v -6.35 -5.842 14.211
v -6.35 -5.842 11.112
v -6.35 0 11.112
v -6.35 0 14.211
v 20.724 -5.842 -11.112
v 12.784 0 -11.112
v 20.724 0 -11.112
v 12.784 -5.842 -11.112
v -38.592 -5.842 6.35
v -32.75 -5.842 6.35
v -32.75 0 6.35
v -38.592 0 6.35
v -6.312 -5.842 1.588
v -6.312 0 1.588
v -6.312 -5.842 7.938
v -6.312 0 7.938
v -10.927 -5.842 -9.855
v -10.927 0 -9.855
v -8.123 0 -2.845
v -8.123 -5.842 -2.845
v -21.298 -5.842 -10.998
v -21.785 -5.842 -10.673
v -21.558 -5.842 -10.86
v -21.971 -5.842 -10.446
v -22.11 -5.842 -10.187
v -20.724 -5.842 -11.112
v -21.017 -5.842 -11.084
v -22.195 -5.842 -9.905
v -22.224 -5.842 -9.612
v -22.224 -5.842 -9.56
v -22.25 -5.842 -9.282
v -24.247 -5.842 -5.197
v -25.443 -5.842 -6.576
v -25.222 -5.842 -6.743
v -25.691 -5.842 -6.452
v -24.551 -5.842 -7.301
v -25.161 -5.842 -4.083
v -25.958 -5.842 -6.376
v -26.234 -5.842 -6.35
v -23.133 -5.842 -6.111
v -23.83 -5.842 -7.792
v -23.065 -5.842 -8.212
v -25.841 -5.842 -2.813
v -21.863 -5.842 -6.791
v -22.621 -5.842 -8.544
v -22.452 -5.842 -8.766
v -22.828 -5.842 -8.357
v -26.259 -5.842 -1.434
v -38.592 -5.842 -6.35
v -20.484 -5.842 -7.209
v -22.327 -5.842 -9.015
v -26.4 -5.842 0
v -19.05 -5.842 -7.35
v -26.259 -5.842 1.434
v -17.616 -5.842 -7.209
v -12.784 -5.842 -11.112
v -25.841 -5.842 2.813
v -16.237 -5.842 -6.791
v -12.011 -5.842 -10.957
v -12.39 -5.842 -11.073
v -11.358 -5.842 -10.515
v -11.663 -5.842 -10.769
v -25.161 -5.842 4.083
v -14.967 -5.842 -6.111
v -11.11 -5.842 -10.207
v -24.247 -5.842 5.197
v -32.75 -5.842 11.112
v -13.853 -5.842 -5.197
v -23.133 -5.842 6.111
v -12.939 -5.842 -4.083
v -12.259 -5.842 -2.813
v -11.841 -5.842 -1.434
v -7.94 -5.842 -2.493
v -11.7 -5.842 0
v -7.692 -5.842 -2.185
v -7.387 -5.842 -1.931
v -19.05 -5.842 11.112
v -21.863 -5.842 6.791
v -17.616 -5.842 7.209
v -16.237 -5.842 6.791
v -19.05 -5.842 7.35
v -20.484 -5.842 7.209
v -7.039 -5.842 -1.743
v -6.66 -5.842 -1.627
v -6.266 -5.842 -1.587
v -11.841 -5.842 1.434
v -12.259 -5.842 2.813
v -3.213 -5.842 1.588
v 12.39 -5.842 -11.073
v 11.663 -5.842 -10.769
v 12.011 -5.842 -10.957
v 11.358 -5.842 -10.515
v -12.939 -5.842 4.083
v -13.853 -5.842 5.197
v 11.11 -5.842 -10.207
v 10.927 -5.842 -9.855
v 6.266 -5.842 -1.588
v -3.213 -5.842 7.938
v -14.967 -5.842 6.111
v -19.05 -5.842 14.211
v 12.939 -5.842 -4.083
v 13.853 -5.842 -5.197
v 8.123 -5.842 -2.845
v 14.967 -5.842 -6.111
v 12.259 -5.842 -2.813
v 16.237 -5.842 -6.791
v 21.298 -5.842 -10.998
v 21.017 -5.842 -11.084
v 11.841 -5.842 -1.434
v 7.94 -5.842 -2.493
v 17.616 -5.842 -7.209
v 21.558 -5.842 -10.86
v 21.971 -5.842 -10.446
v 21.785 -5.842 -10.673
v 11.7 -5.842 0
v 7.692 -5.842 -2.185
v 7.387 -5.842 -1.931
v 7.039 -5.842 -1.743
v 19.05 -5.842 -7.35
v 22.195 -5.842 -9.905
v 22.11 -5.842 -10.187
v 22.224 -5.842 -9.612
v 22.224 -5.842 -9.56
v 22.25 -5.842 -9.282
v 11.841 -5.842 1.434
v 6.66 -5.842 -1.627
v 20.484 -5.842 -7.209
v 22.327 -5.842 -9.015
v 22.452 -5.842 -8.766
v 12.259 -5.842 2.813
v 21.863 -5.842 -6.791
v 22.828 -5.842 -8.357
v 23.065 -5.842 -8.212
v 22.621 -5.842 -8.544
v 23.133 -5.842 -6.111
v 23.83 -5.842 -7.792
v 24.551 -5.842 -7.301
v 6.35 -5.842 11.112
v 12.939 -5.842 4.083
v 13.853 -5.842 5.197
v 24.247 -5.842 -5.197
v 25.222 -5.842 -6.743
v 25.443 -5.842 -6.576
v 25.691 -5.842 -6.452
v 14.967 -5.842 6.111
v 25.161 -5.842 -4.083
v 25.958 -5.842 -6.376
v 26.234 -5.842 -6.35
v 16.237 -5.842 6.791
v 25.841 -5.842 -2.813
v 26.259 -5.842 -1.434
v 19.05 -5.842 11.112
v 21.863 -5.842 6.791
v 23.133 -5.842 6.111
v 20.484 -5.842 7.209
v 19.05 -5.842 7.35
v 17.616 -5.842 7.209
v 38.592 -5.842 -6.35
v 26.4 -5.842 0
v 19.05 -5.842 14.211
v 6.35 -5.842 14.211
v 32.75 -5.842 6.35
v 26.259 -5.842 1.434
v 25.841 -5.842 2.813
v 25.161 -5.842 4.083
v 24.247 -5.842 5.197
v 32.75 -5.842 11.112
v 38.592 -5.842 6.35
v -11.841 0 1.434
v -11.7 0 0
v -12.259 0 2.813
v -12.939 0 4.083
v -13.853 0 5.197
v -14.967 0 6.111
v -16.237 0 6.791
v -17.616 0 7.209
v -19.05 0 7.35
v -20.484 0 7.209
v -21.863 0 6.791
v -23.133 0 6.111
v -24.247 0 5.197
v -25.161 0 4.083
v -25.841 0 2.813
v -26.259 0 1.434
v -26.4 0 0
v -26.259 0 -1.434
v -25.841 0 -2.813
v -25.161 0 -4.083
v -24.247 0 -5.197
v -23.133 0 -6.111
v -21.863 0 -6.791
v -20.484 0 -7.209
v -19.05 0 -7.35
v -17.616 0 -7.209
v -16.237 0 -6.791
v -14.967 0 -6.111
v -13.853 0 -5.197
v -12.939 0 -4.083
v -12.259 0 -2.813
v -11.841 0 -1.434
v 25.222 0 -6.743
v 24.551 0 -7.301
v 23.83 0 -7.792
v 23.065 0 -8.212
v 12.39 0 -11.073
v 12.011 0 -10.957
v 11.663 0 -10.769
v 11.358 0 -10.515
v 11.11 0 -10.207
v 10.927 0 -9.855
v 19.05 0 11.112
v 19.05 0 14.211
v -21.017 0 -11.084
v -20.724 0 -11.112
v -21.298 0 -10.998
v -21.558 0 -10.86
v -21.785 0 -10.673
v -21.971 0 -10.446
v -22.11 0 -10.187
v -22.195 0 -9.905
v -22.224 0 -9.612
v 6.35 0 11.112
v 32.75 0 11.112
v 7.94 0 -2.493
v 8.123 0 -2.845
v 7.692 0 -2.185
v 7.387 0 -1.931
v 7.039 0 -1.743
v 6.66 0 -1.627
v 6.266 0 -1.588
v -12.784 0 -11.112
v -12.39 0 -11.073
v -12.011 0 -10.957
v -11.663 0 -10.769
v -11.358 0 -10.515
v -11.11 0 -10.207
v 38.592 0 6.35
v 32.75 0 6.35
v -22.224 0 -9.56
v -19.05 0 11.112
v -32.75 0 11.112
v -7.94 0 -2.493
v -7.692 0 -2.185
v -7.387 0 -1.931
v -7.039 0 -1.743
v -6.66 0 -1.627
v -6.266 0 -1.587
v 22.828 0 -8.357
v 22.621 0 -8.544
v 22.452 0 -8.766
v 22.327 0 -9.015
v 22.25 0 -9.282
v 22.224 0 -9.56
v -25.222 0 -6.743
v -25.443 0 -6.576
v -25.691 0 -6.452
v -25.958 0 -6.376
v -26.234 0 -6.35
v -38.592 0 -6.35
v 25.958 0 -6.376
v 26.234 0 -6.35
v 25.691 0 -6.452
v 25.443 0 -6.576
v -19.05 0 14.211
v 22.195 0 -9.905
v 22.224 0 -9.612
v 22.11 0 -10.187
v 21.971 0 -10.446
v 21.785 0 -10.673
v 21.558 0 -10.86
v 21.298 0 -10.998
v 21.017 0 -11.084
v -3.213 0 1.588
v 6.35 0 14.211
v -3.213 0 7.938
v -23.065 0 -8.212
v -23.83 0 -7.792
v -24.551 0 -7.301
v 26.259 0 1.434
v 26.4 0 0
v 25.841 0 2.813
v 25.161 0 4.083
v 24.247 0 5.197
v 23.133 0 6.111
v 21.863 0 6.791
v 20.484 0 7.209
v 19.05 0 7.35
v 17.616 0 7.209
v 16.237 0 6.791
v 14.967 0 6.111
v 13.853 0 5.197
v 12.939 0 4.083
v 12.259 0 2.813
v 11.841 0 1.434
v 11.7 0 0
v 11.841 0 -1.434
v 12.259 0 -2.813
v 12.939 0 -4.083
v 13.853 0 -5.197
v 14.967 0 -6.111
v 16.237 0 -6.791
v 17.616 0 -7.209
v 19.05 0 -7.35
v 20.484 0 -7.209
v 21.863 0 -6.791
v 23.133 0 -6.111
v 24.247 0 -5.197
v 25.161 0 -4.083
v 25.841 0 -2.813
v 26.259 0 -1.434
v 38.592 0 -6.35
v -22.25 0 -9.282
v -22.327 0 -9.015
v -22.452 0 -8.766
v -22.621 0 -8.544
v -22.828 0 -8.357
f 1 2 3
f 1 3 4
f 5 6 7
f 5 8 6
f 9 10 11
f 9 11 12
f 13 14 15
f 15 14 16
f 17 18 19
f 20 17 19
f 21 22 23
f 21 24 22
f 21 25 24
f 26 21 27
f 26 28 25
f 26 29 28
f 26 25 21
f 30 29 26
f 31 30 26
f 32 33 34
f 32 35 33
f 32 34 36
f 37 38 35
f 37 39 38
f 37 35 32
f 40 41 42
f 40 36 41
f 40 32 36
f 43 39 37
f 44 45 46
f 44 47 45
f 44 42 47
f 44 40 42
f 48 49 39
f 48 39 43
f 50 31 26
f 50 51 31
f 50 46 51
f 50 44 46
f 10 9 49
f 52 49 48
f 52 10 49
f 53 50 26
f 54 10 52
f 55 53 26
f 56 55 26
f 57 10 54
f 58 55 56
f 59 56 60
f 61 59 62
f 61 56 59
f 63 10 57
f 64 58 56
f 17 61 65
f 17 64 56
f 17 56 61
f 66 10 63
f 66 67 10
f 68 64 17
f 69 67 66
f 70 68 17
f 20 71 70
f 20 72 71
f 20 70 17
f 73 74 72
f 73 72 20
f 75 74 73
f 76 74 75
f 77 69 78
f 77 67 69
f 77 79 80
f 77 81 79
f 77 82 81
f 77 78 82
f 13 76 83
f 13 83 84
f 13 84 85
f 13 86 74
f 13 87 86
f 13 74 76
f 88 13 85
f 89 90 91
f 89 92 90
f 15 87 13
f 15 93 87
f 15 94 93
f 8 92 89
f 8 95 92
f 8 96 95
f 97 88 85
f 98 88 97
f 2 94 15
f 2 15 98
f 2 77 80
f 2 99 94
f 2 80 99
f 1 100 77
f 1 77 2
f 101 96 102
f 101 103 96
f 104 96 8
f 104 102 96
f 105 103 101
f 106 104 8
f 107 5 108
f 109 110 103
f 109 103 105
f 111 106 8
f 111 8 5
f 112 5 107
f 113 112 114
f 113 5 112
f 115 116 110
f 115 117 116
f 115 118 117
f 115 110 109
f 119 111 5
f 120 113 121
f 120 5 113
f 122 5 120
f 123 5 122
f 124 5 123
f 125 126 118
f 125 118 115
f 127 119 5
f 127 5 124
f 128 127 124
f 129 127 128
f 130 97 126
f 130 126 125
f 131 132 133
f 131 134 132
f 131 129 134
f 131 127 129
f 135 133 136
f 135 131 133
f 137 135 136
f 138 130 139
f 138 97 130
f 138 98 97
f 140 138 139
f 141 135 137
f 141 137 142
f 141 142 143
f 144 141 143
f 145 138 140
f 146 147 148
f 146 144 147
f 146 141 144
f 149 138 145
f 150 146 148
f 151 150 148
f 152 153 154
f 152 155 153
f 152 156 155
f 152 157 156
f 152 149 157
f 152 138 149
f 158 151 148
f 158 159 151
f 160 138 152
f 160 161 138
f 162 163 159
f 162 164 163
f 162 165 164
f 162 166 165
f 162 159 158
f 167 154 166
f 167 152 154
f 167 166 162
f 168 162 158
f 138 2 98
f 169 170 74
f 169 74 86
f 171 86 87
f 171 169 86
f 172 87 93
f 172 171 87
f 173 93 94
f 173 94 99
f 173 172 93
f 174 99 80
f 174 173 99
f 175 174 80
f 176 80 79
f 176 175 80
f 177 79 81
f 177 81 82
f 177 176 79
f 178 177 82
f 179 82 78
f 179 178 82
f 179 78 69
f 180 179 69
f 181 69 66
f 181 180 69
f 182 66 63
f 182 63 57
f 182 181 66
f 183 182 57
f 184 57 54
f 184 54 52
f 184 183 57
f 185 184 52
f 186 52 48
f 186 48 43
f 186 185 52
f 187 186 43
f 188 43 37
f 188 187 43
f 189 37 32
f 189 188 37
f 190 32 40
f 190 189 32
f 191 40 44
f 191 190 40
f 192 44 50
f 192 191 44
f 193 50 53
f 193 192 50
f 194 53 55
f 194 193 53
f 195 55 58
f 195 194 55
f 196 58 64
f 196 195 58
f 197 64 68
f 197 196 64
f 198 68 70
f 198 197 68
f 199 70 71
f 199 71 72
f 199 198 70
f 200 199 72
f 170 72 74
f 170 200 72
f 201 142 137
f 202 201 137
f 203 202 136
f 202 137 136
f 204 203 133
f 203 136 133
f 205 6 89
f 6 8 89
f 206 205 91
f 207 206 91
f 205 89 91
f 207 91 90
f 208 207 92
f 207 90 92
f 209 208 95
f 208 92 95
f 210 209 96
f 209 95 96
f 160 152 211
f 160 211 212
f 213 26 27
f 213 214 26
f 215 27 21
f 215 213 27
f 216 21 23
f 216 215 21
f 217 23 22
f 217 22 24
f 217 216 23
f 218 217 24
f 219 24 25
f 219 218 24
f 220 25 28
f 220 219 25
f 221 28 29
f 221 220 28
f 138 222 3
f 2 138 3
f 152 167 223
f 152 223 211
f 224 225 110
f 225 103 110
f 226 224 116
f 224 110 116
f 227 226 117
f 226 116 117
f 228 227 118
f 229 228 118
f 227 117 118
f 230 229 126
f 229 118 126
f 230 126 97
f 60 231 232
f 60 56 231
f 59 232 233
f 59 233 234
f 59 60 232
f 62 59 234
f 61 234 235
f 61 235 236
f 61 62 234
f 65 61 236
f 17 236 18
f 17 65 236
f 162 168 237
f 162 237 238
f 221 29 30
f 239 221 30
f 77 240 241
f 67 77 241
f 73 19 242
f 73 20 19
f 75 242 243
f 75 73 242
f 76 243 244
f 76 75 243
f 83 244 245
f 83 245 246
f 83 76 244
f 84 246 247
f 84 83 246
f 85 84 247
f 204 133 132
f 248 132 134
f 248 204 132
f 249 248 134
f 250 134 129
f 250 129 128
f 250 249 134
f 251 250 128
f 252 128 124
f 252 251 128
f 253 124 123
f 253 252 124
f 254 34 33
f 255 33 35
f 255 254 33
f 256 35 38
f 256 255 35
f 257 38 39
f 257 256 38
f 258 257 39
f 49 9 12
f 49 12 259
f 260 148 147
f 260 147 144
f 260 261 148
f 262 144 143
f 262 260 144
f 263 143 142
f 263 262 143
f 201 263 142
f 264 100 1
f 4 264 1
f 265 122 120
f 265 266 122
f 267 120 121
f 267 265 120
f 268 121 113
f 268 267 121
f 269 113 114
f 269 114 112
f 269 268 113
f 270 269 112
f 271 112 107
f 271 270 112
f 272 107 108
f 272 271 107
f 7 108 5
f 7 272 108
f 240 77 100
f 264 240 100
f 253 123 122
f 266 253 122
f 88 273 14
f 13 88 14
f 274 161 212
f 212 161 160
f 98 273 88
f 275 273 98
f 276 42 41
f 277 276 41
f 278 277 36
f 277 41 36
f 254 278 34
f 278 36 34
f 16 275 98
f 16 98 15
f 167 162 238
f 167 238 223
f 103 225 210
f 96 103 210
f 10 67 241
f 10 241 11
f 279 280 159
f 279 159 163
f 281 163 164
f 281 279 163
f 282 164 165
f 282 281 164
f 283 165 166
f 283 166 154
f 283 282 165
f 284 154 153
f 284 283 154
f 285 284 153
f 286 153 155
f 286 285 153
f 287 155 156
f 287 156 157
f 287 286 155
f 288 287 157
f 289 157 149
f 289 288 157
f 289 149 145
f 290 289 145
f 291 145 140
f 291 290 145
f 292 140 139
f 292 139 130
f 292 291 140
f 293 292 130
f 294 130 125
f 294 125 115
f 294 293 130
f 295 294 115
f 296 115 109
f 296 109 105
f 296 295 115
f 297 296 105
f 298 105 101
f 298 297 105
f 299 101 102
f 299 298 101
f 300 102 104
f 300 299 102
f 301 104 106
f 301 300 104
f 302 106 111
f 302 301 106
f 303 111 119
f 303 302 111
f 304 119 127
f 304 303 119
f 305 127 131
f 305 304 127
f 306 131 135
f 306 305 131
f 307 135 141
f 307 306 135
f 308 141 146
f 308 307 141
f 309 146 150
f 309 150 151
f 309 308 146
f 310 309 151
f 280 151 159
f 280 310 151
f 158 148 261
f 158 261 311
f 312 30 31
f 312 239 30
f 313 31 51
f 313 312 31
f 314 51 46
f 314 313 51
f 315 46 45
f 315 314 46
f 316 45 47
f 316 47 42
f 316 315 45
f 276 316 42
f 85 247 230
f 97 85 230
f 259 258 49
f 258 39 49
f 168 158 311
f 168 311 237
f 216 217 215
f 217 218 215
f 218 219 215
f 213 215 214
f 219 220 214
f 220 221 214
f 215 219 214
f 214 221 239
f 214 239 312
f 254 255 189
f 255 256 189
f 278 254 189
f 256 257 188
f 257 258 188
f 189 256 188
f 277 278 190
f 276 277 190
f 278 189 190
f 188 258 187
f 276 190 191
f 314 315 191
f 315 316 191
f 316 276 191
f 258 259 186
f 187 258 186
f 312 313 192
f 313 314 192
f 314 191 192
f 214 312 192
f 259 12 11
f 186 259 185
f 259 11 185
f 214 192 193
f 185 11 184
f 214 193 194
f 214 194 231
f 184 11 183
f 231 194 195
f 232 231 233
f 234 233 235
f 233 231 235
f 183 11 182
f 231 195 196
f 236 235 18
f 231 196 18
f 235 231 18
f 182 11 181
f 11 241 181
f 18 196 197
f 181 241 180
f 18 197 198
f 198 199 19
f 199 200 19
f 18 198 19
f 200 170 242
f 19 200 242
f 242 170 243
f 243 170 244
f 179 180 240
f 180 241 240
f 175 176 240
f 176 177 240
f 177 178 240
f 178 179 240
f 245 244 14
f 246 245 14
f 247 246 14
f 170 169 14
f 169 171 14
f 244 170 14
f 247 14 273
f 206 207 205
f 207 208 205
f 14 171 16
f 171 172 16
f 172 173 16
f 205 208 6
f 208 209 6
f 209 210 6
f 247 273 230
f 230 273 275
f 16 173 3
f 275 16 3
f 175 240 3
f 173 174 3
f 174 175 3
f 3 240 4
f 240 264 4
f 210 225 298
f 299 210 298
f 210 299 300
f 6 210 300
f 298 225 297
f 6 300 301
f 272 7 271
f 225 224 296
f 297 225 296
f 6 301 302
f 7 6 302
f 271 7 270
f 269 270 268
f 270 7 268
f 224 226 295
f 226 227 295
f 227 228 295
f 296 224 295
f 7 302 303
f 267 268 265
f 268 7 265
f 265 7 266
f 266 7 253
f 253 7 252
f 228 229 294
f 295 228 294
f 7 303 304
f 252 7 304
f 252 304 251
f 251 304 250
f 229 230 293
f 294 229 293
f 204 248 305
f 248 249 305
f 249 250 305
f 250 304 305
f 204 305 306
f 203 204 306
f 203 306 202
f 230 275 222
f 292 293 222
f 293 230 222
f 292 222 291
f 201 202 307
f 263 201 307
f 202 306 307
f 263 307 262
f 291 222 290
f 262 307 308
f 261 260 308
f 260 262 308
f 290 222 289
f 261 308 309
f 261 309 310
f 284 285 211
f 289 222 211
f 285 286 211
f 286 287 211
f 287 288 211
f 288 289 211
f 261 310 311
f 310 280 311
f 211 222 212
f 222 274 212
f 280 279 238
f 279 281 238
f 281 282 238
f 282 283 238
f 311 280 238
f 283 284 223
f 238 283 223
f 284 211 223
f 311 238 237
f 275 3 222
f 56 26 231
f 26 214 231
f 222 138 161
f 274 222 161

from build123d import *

# Parameters (mm, degrees)
F0_R      = 7.35
F1_DEPTH  = 5.842
F2_R      = 2
F3_W      = 3.0988
F3_H      = 6.35
F4_DEPTH  = 25.4
F5_W      = 12.7
F5_H      = 3.0988
F6_DEPTH  = 5.842
F8_DEPTH  = 5.842
F10_DEPTH = 25.4
F11_R     = 1.5


with BuildPart() as f1:
    # F0 (on Front) → F1 (new body)
    with BuildSketch(Plane.XZ):
        Polygon((31.75, 11.1125), (-31.75, 11.1125), (-31.75, -11.1125), (-11.43, -11.1125), (-7.62, -1.5875), (0, -1.5875), (7.62, -1.5875), (11.43, -11.1125), (31.75, -11.1125), align=None)
        with Locations((-19.05, 0)):
            Circle(F0_R, mode=Mode.SUBTRACT)
        with Locations((19.05, 0)):
            Circle(F0_R, mode=Mode.SUBTRACT)
    extrude(amount=F1_DEPTH)

    # F2
    f2_edges = [f1.edges().sort_by_distance(p)[0] for p in [
        (-11.43, -2.921, -11.1125),
        (-7.62, -2.921, -1.5875),
        (7.62, -2.921, -1.5875),
        (11.43, -2.921, -11.1125),
    ]]
    fillet(f2_edges, radius=F2_R)

    # F3 (on face) → F4 (cut)
    with BuildSketch(Plane(origin=(0, 0, 0), x_dir=(-1, 0, 0), z_dir=(0, 1, 0))):
        with Locations((4.7625, 4.7625)):
            Rectangle(F3_W, F3_H)
    extrude(amount=-F4_DEPTH, mode=Mode.SUBTRACT)

    # F5 (on face) → F6 (join, through all)
    with BuildSketch(Plane.XZ.offset(5.842)):
        with Locations((-12.7, 12.6619)):
            Rectangle(F5_W, F5_H)
        with Locations((12.7, 12.6619)):
            Rectangle(F5_W, F5_H)
    extrude(amount=-F6_DEPTH)

    # F7 (on face) → F8 (join, through all)
    with BuildSketch(Plane.XZ.offset(5.842)):
        Polygon((38.592, 6.35), (32.75, 6.35), (32.75, 11.1125), (31.75, 11.1125), (31.75, 6.35), (31.75, -6.35), (31.75, -11.1125), (32.75, -11.1125), (32.75, -6.35), (38.592, -6.35), align=None)
        Polygon((-31.75, 6.35), (-31.75, 11.1125), (-32.75, 11.1125), (-32.75, 6.35), (-38.592, 6.35), (-38.592, -6.35), (-32.75, -6.35), (-32.75, -11.1125), (-31.75, -11.1125), (-31.75, -6.35), align=None)
    extrude(amount=-F8_DEPTH)

    # F9 (on face) → F10 (cut)
    with BuildSketch(Plane.XZ.offset(5.842)):
        with BuildLine():
            Line((-22.22424, -11.1125), (-22.22424, -8.5725))
            ThreePointArc((-22.22424, -8.5725), (-24.0500663267, -7.652639581), (-25.625793171, -6.35))
            Line((-25.625793171, -6.35), (-32.75, -6.35))
            Line((-32.75, -6.35), (-32.75, -8.5725))
            Line((-32.75, -8.5725), (-32.75, -11.1125))
            Line((-32.75, -11.1125), (-22.22424, -11.1125))
        make_face()
        with BuildLine():
            Line((32.75, -8.5725), (32.75, -6.35))
            Line((32.75, -6.35), (25.625793171, -6.35))
            ThreePointArc((25.625793171, -6.35), (24.0500663267, -7.652639581), (22.22424, -8.5725))
            Line((22.22424, -8.5725), (22.22424, -11.1125))
            Line((22.22424, -11.1125), (32.75, -11.1125))
            Line((32.75, -11.1125), (32.75, -8.5725))
        make_face()
    extrude(amount=-F10_DEPTH, mode=Mode.SUBTRACT)

    # F11
    f11_edges = [f1.edges().sort_by_distance(p)[0] for p in [
        (25.625793, -2.921, -6.35),
        (22.22424, -2.921, -11.1125),
        (22.22424, -2.921, -8.5725),
        (-25.625793, -2.921, -6.35),
        (-22.22424, -2.921, -8.5725),
        (-22.22424, -2.921, -11.1125),
    ]]
    fillet(f11_edges, radius=F11_R)


solid = f1.part
